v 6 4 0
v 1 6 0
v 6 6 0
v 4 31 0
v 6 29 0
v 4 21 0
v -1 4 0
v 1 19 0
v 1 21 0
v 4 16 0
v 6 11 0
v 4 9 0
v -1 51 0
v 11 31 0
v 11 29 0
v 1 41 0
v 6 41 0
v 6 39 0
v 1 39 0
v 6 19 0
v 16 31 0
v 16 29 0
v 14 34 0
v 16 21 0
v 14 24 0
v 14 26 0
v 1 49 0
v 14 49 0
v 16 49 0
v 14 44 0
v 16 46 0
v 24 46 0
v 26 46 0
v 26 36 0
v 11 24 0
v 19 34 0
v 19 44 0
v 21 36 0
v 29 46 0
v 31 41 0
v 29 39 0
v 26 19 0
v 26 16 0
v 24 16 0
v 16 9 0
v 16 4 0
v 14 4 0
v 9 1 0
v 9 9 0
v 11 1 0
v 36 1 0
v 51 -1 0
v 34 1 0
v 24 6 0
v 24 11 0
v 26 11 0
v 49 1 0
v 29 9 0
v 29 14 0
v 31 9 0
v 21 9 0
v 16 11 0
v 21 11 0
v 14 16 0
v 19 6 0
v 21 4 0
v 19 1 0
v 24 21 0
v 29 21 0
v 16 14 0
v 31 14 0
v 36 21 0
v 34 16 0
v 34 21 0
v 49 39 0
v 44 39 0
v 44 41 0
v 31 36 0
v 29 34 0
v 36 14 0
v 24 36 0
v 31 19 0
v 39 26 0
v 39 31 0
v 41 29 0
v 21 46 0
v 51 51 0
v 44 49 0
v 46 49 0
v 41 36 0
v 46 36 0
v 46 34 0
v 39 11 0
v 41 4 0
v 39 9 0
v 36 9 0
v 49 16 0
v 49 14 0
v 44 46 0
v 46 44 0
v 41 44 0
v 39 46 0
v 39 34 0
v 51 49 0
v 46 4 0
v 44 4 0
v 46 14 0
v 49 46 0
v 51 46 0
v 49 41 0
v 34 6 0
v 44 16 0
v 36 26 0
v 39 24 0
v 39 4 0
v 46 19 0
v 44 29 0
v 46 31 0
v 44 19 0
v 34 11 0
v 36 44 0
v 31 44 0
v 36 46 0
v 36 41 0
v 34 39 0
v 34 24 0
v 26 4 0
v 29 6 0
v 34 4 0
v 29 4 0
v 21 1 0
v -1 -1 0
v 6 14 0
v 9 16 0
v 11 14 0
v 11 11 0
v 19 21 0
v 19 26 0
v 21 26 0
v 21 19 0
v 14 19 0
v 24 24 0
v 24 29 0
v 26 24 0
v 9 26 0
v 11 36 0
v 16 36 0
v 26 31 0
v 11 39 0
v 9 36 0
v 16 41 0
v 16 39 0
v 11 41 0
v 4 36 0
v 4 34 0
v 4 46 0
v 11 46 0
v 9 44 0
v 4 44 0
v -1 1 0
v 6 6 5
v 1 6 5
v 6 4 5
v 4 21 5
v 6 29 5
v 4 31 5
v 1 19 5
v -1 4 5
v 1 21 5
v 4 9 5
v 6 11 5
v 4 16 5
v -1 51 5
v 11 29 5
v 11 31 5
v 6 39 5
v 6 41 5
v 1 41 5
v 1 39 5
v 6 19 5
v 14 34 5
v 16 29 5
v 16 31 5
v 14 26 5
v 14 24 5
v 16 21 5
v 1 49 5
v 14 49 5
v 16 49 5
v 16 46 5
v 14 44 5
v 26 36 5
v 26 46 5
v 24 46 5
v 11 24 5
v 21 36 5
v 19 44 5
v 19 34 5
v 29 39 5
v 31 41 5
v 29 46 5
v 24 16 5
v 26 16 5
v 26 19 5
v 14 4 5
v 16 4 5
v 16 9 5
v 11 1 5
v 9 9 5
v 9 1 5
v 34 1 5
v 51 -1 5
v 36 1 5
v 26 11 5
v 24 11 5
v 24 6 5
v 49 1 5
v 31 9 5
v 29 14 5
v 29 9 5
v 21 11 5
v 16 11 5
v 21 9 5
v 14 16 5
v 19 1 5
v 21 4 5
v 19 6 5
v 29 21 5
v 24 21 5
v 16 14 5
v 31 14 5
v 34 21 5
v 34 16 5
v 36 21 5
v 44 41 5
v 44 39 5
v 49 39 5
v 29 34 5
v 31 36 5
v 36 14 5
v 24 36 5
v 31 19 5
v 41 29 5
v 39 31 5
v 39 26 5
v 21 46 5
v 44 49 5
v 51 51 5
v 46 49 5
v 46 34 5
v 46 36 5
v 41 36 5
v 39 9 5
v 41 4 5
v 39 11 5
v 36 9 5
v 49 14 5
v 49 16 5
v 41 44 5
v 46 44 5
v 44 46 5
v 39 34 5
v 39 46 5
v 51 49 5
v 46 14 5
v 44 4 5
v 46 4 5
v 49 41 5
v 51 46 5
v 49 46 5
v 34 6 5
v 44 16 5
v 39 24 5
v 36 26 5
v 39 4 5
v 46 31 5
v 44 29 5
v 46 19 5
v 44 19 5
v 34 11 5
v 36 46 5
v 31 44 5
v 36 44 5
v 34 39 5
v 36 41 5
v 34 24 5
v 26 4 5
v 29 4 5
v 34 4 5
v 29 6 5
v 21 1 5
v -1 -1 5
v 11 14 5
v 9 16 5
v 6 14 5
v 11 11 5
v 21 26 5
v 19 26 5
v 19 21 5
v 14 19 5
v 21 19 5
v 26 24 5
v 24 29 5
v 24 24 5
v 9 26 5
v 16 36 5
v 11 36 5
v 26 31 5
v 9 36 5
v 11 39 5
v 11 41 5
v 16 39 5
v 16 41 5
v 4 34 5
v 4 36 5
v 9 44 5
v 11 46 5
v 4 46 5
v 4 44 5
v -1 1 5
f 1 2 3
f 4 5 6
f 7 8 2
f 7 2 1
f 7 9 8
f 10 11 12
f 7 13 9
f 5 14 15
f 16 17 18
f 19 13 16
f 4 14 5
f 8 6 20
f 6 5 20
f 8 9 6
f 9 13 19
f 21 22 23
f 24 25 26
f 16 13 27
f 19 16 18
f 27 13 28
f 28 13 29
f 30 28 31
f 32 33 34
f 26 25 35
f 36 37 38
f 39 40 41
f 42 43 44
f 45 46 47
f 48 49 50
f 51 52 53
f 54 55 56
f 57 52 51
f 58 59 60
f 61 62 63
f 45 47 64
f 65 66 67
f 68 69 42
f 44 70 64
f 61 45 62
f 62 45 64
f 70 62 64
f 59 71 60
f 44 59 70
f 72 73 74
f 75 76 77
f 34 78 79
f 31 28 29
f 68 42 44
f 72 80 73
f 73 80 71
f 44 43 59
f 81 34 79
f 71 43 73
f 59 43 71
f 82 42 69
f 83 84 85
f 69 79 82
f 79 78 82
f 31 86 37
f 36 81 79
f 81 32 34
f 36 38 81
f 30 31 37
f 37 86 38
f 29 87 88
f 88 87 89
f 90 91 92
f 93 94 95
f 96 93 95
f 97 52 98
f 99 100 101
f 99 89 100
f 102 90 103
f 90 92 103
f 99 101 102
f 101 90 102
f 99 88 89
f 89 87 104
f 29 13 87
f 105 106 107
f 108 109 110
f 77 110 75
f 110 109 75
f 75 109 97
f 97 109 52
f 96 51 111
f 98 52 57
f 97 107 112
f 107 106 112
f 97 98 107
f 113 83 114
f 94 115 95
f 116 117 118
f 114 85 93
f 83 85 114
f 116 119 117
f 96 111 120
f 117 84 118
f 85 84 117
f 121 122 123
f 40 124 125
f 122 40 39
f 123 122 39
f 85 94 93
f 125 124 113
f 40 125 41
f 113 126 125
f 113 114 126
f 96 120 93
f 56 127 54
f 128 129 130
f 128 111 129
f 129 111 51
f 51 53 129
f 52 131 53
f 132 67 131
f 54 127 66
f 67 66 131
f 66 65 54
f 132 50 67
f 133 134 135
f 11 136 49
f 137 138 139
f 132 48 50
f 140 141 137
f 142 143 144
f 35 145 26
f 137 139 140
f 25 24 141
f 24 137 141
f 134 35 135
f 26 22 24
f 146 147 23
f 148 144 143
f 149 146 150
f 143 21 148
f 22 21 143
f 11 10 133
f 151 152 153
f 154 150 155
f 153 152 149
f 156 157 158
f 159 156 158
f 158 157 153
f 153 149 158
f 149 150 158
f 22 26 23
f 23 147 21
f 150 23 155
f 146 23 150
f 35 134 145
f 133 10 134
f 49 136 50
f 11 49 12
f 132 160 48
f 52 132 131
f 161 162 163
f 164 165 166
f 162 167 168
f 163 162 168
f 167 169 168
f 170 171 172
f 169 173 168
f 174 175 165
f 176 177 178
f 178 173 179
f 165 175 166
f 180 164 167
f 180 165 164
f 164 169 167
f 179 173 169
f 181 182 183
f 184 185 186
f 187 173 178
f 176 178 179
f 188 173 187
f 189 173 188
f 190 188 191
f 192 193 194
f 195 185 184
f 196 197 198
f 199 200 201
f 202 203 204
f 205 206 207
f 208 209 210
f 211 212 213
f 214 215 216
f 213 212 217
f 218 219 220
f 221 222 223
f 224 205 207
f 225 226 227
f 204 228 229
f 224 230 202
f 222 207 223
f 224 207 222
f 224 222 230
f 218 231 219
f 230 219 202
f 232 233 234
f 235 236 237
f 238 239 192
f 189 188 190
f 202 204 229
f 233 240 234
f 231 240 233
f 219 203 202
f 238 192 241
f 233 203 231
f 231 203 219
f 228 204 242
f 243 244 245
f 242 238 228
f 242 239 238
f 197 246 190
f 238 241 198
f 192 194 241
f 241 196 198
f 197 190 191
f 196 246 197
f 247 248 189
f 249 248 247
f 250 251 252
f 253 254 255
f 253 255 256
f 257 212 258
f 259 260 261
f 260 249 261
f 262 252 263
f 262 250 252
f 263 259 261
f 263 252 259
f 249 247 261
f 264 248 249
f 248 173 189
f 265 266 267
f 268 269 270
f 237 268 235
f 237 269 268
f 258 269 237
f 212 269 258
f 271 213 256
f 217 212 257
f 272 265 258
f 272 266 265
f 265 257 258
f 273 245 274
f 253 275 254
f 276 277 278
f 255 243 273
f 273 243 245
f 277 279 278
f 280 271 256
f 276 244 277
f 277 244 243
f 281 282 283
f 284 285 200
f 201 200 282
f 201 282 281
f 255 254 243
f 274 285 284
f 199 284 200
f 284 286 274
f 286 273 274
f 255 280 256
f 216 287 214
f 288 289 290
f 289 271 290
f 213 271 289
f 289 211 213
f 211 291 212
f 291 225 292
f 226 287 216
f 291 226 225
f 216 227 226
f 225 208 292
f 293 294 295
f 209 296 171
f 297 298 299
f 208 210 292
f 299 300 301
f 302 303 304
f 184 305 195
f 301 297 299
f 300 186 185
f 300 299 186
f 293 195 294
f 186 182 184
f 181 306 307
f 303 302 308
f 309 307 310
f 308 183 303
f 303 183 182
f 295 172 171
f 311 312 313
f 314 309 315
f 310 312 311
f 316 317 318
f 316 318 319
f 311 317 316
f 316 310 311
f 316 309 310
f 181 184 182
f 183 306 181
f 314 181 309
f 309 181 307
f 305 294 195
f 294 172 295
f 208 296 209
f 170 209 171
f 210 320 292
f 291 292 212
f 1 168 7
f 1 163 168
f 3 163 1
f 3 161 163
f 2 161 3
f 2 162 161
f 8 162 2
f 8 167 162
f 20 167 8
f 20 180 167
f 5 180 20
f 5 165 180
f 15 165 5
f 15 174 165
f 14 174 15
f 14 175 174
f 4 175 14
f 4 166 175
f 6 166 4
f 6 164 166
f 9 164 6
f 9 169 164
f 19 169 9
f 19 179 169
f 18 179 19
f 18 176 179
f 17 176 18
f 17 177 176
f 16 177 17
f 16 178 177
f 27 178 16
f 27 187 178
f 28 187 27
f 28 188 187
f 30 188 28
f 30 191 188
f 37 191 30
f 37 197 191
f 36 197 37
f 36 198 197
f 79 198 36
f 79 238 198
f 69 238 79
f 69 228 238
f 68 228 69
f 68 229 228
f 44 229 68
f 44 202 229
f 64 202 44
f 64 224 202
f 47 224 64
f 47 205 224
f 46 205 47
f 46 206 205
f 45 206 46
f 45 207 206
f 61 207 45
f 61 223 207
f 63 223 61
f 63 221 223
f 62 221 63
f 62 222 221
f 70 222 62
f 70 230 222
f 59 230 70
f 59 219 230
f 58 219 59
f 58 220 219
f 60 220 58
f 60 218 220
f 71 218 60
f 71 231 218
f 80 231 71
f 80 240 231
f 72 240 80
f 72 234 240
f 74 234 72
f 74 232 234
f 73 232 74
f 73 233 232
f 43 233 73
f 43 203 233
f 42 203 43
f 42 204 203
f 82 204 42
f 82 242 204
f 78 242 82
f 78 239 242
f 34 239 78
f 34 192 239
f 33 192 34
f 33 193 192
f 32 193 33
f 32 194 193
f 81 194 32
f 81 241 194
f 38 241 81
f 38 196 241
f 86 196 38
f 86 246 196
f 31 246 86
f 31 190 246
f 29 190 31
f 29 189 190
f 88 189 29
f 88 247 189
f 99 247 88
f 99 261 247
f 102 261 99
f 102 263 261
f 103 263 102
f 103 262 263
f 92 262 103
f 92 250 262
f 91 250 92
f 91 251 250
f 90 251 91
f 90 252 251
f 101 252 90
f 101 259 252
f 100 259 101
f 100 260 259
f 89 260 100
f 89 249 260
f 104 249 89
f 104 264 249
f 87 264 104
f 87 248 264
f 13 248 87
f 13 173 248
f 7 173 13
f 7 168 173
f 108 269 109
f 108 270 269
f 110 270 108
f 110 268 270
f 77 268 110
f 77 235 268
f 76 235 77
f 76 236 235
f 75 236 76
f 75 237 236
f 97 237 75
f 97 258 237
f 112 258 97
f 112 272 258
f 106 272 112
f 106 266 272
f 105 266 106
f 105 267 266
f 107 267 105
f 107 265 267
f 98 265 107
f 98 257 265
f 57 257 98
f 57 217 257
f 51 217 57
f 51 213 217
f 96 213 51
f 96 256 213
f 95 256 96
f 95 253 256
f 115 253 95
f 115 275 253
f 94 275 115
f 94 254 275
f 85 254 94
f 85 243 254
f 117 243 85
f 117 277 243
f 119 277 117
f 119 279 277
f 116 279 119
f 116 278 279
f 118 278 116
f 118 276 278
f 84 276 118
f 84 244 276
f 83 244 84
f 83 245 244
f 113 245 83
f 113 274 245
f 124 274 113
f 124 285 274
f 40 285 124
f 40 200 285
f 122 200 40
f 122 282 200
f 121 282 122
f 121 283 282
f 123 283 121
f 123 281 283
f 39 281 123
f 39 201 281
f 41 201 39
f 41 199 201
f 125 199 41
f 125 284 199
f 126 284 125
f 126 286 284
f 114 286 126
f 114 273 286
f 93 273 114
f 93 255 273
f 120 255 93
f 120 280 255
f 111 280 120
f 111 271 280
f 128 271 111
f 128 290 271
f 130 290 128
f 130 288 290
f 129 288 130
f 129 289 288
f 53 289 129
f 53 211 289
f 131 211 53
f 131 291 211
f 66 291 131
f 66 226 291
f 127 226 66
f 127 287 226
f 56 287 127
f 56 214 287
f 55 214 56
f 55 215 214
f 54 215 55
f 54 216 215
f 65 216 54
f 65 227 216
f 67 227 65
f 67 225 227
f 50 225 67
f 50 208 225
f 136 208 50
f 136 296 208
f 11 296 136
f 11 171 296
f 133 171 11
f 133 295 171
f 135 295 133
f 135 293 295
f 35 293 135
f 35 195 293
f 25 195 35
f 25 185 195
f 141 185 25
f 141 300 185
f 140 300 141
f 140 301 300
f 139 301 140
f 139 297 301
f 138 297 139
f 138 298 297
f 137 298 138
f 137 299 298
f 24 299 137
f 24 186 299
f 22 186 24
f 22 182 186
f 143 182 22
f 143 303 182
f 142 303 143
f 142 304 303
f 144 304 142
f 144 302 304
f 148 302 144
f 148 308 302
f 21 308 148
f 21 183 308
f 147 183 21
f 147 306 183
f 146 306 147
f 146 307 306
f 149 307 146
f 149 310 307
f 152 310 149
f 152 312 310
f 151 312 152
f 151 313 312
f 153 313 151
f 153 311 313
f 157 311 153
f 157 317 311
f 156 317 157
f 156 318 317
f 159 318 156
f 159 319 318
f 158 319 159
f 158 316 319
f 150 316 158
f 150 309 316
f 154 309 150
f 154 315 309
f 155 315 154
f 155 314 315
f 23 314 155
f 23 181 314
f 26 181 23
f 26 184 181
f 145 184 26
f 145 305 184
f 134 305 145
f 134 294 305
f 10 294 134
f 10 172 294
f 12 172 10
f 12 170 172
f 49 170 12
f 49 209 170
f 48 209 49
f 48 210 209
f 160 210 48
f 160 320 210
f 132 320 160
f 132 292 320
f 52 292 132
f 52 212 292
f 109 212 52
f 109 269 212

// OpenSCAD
// file: 2d.scad
function PI() = 3.14159;

// give a [x, y] point and length. draw a line in the x direction
module x_line(point, length, thickness = 1) {
    offset = thickness / 2;
    translate([point[0] - offset, point[1] - offset, 0]) 
        square([length + thickness, thickness]);
}

// give a [x, y] point and length. draw a line in the y direction
module y_line(point, length, thickness = 1) {
    offset = thickness / 2;
    translate([point[0] - offset, point[1] - offset, 0])  
        square([thickness, length + thickness]);
}

module a_quarter_arc(radius, angle, width = 1) {
    outer = radius + width;
    intersection() {
        difference() {
            offset(r = width) circle(radius, $fn=96); 
            circle(radius, $fn=96);
        }
        polygon([[0, 0], [outer, 0], [outer, outer * sin(angle)], [outer * cos(angle), outer * sin(angle)]]);
    }
}

module arc(radius, angles, width = 1) {
    angle_from = angles[0];
    angle_to = angles[1];
    angle_difference = angle_to - angle_from;
    outer = radius + width;
    rotate(angle_from)
        if(angle_difference <= 90) {
            a_quarter_arc(radius, angle_difference, width);
        } else if(angle_difference > 90 && angle_difference <= 180) {
            arc(radius, [0, 90], width);
            rotate(90) a_quarter_arc(radius, angle_difference - 90, width);
        } else if(angle_difference > 180 && angle_difference <= 270) {
            arc(radius, [0, 180], width);
            rotate(180) a_quarter_arc(radius, angle_difference - 180, width);
        } else if(angle_difference > 270 && angle_difference <= 360) {
            arc(radius, [0, 270], width);
            rotate(270) a_quarter_arc(radius, angle_difference - 270, width);
       }
}




// create a equilateral triangle
module equilateral_triangle(side_length, center = false) {
    radius = 0.57735026918962576450914878050196 * side_length;
	circle(r = radius, center = center, $fn = 3); 
}

// create a holly equilateral triangle
module holly_equilateral_triangle(side_length, thickness = 1, center = true) {
    difference() {
	    offset(delta = thickness) equilateral_triangle(side_length, center = center);
	    equilateral_triangle(side_length, center = center);
    }
}

module a_quarter_sector(radius, angle) {
    intersection() {
        circle(radius, $fn=96);
        
        polygon([[0, 0], [radius, 0], [radius, radius * sin(angle)], [radius * cos(angle), radius * sin(angle)]]);
    }
}

module sector(radius, angles) {
    angle_from = angles[0];
    angle_to = angles[1];
    angle_difference = angle_to - angle_from;

    rotate(angle_from)
        if(angle_difference <= 90) {
            a_quarter_sector(radius, angle_difference);
        } else if(angle_difference > 90 && angle_difference <= 180) {
            sector(radius, [0, 90]);
            rotate(90) a_quarter_sector(radius, angle_difference - 90);
        } else if(angle_difference > 180 && angle_difference <= 270) {
            sector(radius, [0, 180]);
            rotate(180) a_quarter_sector(radius, angle_difference - 180);
        } else if(angle_difference > 270 && angle_difference <= 360) {
            sector(radius, [0, 270]);
            rotate(270) a_quarter_sector(radius, angle_difference - 270);
       }
}

// The heart is composed of two semi-circles and two isosceles triangles. 
// The triangle's two equal sides have length equals to the double `radius` of the circle.
// That's why the `solid_heart` module is drawn according a `radius` parameter.
module solid_heart(radius, tip_factor) {
    offset_h = 2.2360679774997896964091736687313 * radius / 2 - radius * sin(45);
	tip_radius = radius / tip_factor;
	
    translate([radius * cos(45), offset_h, 0]) rotate([0, 0, -45])
    hull() {
        circle(radius, $fn = 96);
		translate([radius - tip_radius, -radius * 2 + tip_radius, 0]) 
		    circle(tip_radius, center = true, $fn = 96);
	}
	
	translate([-radius * cos(45), offset_h, 0]) rotate([0, 0, 45]) hull() {
        circle(radius, $fn = 96);
		translate([-radius + tip_radius, -radius * 2 + tip_radius, 0]) 
		    circle(tip_radius, center = true, $fn = 96);
	}
}

module ring_heart(radius, tip_factor, thickness) {
    difference() { 
	    offset(delta = thickness) solid_heart(radius, tip_factor);
        solid_heart(radius, tip_factor);
	}
}
// main file
use <2d.scad>;

rows = 10; 
columns = 10; 
wall_thickness = 2;
wall_height = 5;
block_width = 5;
bottom = "	YES";


/*
 * constants, for clearness
 *
 */
 
// random directions, for picking up a direction to visit the next block
function PERMUTATION_OF_FOUR() = [
    [1, 2, 3, 4],
    [1, 2, 4, 3],
    [1, 3, 2, 4],
    [1, 3, 4, 2],
    [1, 4, 2, 3],
    [1, 4, 3, 2],
    [2, 1, 3, 4],
    [2, 1, 4, 3],
    [2, 3, 1, 4],
    [2, 3, 4, 1],
    [2, 4, 1, 3],
    [2, 4, 3, 1],
    [3, 1, 2, 4],
    [3, 1, 4, 2],
    [3, 2, 1, 4],
    [3, 2, 4, 1],
    [3, 4, 1, 2],
    [3, 4, 2, 1],
    [4, 1, 2, 3],
    [4, 1, 3, 2],
    [4, 2, 1, 3],
    [4, 2, 3, 1],
    [4, 3, 1, 2],
    [4, 3, 2, 1]
];

function NO_WALL() = 0;
function UP_WALL() = 1;
function RIGHT_WALL() = 2;
function UP_RIGHT_WALL() = 3;

function NOT_VISITED() = 0;
function VISITED() = 1;

/* 
 * modules for creating a maze
 *
 */

// create the outer wall of maze
module maze_outer_wall(rows, columns, block_width = 5, wall_thickness = 1) {
    x_line([0, rows * block_width], columns * block_width, wall_thickness);
    y_line([0, block_width], (rows - 1) * block_width, wall_thickness);
}

// create the inner wall of maze
module maze_inner_wall(maze, block_width = 5, wall_thickness = 1) {
    for(i = [0:len(maze) - 1]) {
        cord = maze[i];
        x = (cord[0] - 1) * block_width;
        y = (cord[1] - 1) * block_width;
        v = cord[3];
        
        if(v == 1 || v == 3) {
            x_line([x, y], block_width, wall_thickness);
        }
        if(v == 2 || v == 3) {
            y_line([x + block_width, y], block_width, wall_thickness);
        }
    }  
}

// create a maze
module maze(rows, columns, maze_vector, block_width = 5, wall_thickness = 1) {
     maze_outer_wall(rows, columns, block_width, wall_thickness);
     maze_inner_wall(maze_vector, block_width, wall_thickness);
}

/* 
 * utilities functions
 *
 */

// comare the equality of [x1, y1] and [x2, y2]
function cord_equals(cord1, cord2) = cord1 == cord2;

// is the point visited?
function not_visited(cord, vs, index = 0) =
    index == len(vs) ? true : 
        (cord_equals([vs[index][0], vs[index][1]], cord) && vs[index][2] == 1 ? false :
            not_visited(cord, vs, index + 1));
            
// pick a direction randomly
function rand_dirs() =
    PERMUTATION_OF_FOUR()[round(rands(0, 24, 1)[0])]; 

// give a index (exclusivly), slice a vector 

function head_to(i, vs) = i == 0 ? [] : [for(i = [0 : i - 1]) vs[i]];

// give a index (exclusivly), slice a vector 
function tail_from(i, vs, index = 0, new_vs = []) =
    i >= len(vs) ? [] : (
        index < i ? tail_from(i, vs, index + 1) : (
            index < len(vs) ? tail_from(i, vs, index + 1, concat(new_vs, [vs[index]])) : new_vs
        )
    );

// replace v1 in the vector with v2 
function replace(v1, v2, vs, index = 0) =
    index == len(vs) ? vs : (
        vs[index] == v1 ? concat(concat(head_to(index, vs), [v2]), tail_from(index + 1, vs)) : replace(v1, v2, vs, index + 1)
    );
     
/* 
 * functions for generating a maze vector
 *
 */


// initialize a maze
function init_maze(rows, columns) = 
    [
	    for(c = [1 : columns]) 
	        for(r = [1 : rows]) 
		        [c, r, 0,  UP_RIGHT_WALL()]
	];
    
// find a vector in the maze vector
function find(i, j, maze_vector, index = 0) =
    index == len(maze_vector) ? [] : (
        cord_equals([i, j], [maze_vector[index][0], maze_vector[index][1]]) ? maze_vector[index] : find(i, j, maze_vector, index + 1)
    );

////
// NO_WALL = 0;
// UP_WALL = 1;
// RIGHT_WALL = 2;
// UP_RIGHT_WALL = 3;
function delete_right_wall(original_block) = 
    original_block == NO_WALL() || original_block == RIGHT_WALL() ? NO_WALL() : UP_WALL();

function delete_up_wall(original_block) = 
    (original_block == NO_WALL() || original_block == UP_WALL()) ? NO_WALL() : RIGHT_WALL();
    
function delete_right_wall_of(vs, is_visited, maze_vector) =
    replace(vs, [vs[0], vs[1] , is_visited, delete_right_wall(vs[3])] ,maze_vector);

function delete_up_wall_of(vs, is_visited, maze_vector) =
    replace(vs, [vs[0], vs[1] , is_visited, delete_up_wall(vs[3])] ,maze_vector);

function go_right(i, j, rows, columns, maze_vector) =
    go_maze(i + 1, j, rows, columns, delete_right_wall_of(find(i, j, maze_vector), VISITED(), maze_vector));
    
function go_up(i, j, rows, columns, maze_vector) =
    go_maze(i, j - 1, rows, columns, delete_up_wall_of(find(i, j, maze_vector), VISITED(), maze_vector));
    
function visit(v, maze_vector) =
    replace(v, [v[0], v[1], VISITED(), v[3]], maze_vector);
 
function go_left(i, j, rows, columns, maze_vector) =
    go_maze(i - 1, j, rows, columns, delete_right_wall_of(find(i - 1, j, maze_vector), NOT_VISITED(), maze_vector));
    
function go_down(i, j, rows, columns, maze_vector) =
    go_maze(i, j + 1, rows, columns, delete_up_wall_of(find(i, j + 1, maze_vector), NOT_VISITED(), maze_vector));
    
function go_maze(i, j, rows, columns, maze_vector) =
    look_around(i, j, rand_dirs(), rows, columns, visit(find(i, j, maze_vector), maze_vector));
    
function look_around(i, j, dirs, rows, columns, maze_vector, index = 0) =
    index == 4 ? maze_vector : 
        look_around( 
            i, j, dirs, 
            rows, columns, 
            build_wall(i, j, dirs[index], rows, columns, maze_vector), 
            index + 1
        ); 

function build_wall(i, j, n, rows, columns, maze_vector) = 
    n == 1 && i != columns && not_visited([i + 1, j], maze_vector) ? go_right(i, j, rows, columns, maze_vector) : ( 
        n == 2 && j != 1 && not_visited([i, j - 1], maze_vector) ? go_up(i, j, rows, columns, maze_vector)  : (
            n == 3 && i != 1 && not_visited([i - 1, j], maze_vector) ? go_left(i, j,rows, columns,  maze_vector)  : (
                n == 4 && j != rows && not_visited([i, j + 1], maze_vector) ? go_down(i, j, rows, columns, maze_vector) : maze_vector
            ) 
        )
    ); 

/*
 * create a maze
 *
 */
maze_vector = go_maze(1, 1, rows, columns, replace([columns, rows, 0, UP_RIGHT_WALL()], [columns, rows, 0, UP_WALL()], init_maze(rows, columns)));
linear_extrude(wall_height) 
    maze(rows, columns, maze_vector, block_width, wall_thickness);
	
if(bottom == "YES") {
    translate([-wall_thickness / 2, -wall_thickness / 2, -wall_thickness]) 
	    linear_extrude(wall_thickness) square([block_width * columns + wall_thickness, block_width * rows + wall_thickness]);
}	
